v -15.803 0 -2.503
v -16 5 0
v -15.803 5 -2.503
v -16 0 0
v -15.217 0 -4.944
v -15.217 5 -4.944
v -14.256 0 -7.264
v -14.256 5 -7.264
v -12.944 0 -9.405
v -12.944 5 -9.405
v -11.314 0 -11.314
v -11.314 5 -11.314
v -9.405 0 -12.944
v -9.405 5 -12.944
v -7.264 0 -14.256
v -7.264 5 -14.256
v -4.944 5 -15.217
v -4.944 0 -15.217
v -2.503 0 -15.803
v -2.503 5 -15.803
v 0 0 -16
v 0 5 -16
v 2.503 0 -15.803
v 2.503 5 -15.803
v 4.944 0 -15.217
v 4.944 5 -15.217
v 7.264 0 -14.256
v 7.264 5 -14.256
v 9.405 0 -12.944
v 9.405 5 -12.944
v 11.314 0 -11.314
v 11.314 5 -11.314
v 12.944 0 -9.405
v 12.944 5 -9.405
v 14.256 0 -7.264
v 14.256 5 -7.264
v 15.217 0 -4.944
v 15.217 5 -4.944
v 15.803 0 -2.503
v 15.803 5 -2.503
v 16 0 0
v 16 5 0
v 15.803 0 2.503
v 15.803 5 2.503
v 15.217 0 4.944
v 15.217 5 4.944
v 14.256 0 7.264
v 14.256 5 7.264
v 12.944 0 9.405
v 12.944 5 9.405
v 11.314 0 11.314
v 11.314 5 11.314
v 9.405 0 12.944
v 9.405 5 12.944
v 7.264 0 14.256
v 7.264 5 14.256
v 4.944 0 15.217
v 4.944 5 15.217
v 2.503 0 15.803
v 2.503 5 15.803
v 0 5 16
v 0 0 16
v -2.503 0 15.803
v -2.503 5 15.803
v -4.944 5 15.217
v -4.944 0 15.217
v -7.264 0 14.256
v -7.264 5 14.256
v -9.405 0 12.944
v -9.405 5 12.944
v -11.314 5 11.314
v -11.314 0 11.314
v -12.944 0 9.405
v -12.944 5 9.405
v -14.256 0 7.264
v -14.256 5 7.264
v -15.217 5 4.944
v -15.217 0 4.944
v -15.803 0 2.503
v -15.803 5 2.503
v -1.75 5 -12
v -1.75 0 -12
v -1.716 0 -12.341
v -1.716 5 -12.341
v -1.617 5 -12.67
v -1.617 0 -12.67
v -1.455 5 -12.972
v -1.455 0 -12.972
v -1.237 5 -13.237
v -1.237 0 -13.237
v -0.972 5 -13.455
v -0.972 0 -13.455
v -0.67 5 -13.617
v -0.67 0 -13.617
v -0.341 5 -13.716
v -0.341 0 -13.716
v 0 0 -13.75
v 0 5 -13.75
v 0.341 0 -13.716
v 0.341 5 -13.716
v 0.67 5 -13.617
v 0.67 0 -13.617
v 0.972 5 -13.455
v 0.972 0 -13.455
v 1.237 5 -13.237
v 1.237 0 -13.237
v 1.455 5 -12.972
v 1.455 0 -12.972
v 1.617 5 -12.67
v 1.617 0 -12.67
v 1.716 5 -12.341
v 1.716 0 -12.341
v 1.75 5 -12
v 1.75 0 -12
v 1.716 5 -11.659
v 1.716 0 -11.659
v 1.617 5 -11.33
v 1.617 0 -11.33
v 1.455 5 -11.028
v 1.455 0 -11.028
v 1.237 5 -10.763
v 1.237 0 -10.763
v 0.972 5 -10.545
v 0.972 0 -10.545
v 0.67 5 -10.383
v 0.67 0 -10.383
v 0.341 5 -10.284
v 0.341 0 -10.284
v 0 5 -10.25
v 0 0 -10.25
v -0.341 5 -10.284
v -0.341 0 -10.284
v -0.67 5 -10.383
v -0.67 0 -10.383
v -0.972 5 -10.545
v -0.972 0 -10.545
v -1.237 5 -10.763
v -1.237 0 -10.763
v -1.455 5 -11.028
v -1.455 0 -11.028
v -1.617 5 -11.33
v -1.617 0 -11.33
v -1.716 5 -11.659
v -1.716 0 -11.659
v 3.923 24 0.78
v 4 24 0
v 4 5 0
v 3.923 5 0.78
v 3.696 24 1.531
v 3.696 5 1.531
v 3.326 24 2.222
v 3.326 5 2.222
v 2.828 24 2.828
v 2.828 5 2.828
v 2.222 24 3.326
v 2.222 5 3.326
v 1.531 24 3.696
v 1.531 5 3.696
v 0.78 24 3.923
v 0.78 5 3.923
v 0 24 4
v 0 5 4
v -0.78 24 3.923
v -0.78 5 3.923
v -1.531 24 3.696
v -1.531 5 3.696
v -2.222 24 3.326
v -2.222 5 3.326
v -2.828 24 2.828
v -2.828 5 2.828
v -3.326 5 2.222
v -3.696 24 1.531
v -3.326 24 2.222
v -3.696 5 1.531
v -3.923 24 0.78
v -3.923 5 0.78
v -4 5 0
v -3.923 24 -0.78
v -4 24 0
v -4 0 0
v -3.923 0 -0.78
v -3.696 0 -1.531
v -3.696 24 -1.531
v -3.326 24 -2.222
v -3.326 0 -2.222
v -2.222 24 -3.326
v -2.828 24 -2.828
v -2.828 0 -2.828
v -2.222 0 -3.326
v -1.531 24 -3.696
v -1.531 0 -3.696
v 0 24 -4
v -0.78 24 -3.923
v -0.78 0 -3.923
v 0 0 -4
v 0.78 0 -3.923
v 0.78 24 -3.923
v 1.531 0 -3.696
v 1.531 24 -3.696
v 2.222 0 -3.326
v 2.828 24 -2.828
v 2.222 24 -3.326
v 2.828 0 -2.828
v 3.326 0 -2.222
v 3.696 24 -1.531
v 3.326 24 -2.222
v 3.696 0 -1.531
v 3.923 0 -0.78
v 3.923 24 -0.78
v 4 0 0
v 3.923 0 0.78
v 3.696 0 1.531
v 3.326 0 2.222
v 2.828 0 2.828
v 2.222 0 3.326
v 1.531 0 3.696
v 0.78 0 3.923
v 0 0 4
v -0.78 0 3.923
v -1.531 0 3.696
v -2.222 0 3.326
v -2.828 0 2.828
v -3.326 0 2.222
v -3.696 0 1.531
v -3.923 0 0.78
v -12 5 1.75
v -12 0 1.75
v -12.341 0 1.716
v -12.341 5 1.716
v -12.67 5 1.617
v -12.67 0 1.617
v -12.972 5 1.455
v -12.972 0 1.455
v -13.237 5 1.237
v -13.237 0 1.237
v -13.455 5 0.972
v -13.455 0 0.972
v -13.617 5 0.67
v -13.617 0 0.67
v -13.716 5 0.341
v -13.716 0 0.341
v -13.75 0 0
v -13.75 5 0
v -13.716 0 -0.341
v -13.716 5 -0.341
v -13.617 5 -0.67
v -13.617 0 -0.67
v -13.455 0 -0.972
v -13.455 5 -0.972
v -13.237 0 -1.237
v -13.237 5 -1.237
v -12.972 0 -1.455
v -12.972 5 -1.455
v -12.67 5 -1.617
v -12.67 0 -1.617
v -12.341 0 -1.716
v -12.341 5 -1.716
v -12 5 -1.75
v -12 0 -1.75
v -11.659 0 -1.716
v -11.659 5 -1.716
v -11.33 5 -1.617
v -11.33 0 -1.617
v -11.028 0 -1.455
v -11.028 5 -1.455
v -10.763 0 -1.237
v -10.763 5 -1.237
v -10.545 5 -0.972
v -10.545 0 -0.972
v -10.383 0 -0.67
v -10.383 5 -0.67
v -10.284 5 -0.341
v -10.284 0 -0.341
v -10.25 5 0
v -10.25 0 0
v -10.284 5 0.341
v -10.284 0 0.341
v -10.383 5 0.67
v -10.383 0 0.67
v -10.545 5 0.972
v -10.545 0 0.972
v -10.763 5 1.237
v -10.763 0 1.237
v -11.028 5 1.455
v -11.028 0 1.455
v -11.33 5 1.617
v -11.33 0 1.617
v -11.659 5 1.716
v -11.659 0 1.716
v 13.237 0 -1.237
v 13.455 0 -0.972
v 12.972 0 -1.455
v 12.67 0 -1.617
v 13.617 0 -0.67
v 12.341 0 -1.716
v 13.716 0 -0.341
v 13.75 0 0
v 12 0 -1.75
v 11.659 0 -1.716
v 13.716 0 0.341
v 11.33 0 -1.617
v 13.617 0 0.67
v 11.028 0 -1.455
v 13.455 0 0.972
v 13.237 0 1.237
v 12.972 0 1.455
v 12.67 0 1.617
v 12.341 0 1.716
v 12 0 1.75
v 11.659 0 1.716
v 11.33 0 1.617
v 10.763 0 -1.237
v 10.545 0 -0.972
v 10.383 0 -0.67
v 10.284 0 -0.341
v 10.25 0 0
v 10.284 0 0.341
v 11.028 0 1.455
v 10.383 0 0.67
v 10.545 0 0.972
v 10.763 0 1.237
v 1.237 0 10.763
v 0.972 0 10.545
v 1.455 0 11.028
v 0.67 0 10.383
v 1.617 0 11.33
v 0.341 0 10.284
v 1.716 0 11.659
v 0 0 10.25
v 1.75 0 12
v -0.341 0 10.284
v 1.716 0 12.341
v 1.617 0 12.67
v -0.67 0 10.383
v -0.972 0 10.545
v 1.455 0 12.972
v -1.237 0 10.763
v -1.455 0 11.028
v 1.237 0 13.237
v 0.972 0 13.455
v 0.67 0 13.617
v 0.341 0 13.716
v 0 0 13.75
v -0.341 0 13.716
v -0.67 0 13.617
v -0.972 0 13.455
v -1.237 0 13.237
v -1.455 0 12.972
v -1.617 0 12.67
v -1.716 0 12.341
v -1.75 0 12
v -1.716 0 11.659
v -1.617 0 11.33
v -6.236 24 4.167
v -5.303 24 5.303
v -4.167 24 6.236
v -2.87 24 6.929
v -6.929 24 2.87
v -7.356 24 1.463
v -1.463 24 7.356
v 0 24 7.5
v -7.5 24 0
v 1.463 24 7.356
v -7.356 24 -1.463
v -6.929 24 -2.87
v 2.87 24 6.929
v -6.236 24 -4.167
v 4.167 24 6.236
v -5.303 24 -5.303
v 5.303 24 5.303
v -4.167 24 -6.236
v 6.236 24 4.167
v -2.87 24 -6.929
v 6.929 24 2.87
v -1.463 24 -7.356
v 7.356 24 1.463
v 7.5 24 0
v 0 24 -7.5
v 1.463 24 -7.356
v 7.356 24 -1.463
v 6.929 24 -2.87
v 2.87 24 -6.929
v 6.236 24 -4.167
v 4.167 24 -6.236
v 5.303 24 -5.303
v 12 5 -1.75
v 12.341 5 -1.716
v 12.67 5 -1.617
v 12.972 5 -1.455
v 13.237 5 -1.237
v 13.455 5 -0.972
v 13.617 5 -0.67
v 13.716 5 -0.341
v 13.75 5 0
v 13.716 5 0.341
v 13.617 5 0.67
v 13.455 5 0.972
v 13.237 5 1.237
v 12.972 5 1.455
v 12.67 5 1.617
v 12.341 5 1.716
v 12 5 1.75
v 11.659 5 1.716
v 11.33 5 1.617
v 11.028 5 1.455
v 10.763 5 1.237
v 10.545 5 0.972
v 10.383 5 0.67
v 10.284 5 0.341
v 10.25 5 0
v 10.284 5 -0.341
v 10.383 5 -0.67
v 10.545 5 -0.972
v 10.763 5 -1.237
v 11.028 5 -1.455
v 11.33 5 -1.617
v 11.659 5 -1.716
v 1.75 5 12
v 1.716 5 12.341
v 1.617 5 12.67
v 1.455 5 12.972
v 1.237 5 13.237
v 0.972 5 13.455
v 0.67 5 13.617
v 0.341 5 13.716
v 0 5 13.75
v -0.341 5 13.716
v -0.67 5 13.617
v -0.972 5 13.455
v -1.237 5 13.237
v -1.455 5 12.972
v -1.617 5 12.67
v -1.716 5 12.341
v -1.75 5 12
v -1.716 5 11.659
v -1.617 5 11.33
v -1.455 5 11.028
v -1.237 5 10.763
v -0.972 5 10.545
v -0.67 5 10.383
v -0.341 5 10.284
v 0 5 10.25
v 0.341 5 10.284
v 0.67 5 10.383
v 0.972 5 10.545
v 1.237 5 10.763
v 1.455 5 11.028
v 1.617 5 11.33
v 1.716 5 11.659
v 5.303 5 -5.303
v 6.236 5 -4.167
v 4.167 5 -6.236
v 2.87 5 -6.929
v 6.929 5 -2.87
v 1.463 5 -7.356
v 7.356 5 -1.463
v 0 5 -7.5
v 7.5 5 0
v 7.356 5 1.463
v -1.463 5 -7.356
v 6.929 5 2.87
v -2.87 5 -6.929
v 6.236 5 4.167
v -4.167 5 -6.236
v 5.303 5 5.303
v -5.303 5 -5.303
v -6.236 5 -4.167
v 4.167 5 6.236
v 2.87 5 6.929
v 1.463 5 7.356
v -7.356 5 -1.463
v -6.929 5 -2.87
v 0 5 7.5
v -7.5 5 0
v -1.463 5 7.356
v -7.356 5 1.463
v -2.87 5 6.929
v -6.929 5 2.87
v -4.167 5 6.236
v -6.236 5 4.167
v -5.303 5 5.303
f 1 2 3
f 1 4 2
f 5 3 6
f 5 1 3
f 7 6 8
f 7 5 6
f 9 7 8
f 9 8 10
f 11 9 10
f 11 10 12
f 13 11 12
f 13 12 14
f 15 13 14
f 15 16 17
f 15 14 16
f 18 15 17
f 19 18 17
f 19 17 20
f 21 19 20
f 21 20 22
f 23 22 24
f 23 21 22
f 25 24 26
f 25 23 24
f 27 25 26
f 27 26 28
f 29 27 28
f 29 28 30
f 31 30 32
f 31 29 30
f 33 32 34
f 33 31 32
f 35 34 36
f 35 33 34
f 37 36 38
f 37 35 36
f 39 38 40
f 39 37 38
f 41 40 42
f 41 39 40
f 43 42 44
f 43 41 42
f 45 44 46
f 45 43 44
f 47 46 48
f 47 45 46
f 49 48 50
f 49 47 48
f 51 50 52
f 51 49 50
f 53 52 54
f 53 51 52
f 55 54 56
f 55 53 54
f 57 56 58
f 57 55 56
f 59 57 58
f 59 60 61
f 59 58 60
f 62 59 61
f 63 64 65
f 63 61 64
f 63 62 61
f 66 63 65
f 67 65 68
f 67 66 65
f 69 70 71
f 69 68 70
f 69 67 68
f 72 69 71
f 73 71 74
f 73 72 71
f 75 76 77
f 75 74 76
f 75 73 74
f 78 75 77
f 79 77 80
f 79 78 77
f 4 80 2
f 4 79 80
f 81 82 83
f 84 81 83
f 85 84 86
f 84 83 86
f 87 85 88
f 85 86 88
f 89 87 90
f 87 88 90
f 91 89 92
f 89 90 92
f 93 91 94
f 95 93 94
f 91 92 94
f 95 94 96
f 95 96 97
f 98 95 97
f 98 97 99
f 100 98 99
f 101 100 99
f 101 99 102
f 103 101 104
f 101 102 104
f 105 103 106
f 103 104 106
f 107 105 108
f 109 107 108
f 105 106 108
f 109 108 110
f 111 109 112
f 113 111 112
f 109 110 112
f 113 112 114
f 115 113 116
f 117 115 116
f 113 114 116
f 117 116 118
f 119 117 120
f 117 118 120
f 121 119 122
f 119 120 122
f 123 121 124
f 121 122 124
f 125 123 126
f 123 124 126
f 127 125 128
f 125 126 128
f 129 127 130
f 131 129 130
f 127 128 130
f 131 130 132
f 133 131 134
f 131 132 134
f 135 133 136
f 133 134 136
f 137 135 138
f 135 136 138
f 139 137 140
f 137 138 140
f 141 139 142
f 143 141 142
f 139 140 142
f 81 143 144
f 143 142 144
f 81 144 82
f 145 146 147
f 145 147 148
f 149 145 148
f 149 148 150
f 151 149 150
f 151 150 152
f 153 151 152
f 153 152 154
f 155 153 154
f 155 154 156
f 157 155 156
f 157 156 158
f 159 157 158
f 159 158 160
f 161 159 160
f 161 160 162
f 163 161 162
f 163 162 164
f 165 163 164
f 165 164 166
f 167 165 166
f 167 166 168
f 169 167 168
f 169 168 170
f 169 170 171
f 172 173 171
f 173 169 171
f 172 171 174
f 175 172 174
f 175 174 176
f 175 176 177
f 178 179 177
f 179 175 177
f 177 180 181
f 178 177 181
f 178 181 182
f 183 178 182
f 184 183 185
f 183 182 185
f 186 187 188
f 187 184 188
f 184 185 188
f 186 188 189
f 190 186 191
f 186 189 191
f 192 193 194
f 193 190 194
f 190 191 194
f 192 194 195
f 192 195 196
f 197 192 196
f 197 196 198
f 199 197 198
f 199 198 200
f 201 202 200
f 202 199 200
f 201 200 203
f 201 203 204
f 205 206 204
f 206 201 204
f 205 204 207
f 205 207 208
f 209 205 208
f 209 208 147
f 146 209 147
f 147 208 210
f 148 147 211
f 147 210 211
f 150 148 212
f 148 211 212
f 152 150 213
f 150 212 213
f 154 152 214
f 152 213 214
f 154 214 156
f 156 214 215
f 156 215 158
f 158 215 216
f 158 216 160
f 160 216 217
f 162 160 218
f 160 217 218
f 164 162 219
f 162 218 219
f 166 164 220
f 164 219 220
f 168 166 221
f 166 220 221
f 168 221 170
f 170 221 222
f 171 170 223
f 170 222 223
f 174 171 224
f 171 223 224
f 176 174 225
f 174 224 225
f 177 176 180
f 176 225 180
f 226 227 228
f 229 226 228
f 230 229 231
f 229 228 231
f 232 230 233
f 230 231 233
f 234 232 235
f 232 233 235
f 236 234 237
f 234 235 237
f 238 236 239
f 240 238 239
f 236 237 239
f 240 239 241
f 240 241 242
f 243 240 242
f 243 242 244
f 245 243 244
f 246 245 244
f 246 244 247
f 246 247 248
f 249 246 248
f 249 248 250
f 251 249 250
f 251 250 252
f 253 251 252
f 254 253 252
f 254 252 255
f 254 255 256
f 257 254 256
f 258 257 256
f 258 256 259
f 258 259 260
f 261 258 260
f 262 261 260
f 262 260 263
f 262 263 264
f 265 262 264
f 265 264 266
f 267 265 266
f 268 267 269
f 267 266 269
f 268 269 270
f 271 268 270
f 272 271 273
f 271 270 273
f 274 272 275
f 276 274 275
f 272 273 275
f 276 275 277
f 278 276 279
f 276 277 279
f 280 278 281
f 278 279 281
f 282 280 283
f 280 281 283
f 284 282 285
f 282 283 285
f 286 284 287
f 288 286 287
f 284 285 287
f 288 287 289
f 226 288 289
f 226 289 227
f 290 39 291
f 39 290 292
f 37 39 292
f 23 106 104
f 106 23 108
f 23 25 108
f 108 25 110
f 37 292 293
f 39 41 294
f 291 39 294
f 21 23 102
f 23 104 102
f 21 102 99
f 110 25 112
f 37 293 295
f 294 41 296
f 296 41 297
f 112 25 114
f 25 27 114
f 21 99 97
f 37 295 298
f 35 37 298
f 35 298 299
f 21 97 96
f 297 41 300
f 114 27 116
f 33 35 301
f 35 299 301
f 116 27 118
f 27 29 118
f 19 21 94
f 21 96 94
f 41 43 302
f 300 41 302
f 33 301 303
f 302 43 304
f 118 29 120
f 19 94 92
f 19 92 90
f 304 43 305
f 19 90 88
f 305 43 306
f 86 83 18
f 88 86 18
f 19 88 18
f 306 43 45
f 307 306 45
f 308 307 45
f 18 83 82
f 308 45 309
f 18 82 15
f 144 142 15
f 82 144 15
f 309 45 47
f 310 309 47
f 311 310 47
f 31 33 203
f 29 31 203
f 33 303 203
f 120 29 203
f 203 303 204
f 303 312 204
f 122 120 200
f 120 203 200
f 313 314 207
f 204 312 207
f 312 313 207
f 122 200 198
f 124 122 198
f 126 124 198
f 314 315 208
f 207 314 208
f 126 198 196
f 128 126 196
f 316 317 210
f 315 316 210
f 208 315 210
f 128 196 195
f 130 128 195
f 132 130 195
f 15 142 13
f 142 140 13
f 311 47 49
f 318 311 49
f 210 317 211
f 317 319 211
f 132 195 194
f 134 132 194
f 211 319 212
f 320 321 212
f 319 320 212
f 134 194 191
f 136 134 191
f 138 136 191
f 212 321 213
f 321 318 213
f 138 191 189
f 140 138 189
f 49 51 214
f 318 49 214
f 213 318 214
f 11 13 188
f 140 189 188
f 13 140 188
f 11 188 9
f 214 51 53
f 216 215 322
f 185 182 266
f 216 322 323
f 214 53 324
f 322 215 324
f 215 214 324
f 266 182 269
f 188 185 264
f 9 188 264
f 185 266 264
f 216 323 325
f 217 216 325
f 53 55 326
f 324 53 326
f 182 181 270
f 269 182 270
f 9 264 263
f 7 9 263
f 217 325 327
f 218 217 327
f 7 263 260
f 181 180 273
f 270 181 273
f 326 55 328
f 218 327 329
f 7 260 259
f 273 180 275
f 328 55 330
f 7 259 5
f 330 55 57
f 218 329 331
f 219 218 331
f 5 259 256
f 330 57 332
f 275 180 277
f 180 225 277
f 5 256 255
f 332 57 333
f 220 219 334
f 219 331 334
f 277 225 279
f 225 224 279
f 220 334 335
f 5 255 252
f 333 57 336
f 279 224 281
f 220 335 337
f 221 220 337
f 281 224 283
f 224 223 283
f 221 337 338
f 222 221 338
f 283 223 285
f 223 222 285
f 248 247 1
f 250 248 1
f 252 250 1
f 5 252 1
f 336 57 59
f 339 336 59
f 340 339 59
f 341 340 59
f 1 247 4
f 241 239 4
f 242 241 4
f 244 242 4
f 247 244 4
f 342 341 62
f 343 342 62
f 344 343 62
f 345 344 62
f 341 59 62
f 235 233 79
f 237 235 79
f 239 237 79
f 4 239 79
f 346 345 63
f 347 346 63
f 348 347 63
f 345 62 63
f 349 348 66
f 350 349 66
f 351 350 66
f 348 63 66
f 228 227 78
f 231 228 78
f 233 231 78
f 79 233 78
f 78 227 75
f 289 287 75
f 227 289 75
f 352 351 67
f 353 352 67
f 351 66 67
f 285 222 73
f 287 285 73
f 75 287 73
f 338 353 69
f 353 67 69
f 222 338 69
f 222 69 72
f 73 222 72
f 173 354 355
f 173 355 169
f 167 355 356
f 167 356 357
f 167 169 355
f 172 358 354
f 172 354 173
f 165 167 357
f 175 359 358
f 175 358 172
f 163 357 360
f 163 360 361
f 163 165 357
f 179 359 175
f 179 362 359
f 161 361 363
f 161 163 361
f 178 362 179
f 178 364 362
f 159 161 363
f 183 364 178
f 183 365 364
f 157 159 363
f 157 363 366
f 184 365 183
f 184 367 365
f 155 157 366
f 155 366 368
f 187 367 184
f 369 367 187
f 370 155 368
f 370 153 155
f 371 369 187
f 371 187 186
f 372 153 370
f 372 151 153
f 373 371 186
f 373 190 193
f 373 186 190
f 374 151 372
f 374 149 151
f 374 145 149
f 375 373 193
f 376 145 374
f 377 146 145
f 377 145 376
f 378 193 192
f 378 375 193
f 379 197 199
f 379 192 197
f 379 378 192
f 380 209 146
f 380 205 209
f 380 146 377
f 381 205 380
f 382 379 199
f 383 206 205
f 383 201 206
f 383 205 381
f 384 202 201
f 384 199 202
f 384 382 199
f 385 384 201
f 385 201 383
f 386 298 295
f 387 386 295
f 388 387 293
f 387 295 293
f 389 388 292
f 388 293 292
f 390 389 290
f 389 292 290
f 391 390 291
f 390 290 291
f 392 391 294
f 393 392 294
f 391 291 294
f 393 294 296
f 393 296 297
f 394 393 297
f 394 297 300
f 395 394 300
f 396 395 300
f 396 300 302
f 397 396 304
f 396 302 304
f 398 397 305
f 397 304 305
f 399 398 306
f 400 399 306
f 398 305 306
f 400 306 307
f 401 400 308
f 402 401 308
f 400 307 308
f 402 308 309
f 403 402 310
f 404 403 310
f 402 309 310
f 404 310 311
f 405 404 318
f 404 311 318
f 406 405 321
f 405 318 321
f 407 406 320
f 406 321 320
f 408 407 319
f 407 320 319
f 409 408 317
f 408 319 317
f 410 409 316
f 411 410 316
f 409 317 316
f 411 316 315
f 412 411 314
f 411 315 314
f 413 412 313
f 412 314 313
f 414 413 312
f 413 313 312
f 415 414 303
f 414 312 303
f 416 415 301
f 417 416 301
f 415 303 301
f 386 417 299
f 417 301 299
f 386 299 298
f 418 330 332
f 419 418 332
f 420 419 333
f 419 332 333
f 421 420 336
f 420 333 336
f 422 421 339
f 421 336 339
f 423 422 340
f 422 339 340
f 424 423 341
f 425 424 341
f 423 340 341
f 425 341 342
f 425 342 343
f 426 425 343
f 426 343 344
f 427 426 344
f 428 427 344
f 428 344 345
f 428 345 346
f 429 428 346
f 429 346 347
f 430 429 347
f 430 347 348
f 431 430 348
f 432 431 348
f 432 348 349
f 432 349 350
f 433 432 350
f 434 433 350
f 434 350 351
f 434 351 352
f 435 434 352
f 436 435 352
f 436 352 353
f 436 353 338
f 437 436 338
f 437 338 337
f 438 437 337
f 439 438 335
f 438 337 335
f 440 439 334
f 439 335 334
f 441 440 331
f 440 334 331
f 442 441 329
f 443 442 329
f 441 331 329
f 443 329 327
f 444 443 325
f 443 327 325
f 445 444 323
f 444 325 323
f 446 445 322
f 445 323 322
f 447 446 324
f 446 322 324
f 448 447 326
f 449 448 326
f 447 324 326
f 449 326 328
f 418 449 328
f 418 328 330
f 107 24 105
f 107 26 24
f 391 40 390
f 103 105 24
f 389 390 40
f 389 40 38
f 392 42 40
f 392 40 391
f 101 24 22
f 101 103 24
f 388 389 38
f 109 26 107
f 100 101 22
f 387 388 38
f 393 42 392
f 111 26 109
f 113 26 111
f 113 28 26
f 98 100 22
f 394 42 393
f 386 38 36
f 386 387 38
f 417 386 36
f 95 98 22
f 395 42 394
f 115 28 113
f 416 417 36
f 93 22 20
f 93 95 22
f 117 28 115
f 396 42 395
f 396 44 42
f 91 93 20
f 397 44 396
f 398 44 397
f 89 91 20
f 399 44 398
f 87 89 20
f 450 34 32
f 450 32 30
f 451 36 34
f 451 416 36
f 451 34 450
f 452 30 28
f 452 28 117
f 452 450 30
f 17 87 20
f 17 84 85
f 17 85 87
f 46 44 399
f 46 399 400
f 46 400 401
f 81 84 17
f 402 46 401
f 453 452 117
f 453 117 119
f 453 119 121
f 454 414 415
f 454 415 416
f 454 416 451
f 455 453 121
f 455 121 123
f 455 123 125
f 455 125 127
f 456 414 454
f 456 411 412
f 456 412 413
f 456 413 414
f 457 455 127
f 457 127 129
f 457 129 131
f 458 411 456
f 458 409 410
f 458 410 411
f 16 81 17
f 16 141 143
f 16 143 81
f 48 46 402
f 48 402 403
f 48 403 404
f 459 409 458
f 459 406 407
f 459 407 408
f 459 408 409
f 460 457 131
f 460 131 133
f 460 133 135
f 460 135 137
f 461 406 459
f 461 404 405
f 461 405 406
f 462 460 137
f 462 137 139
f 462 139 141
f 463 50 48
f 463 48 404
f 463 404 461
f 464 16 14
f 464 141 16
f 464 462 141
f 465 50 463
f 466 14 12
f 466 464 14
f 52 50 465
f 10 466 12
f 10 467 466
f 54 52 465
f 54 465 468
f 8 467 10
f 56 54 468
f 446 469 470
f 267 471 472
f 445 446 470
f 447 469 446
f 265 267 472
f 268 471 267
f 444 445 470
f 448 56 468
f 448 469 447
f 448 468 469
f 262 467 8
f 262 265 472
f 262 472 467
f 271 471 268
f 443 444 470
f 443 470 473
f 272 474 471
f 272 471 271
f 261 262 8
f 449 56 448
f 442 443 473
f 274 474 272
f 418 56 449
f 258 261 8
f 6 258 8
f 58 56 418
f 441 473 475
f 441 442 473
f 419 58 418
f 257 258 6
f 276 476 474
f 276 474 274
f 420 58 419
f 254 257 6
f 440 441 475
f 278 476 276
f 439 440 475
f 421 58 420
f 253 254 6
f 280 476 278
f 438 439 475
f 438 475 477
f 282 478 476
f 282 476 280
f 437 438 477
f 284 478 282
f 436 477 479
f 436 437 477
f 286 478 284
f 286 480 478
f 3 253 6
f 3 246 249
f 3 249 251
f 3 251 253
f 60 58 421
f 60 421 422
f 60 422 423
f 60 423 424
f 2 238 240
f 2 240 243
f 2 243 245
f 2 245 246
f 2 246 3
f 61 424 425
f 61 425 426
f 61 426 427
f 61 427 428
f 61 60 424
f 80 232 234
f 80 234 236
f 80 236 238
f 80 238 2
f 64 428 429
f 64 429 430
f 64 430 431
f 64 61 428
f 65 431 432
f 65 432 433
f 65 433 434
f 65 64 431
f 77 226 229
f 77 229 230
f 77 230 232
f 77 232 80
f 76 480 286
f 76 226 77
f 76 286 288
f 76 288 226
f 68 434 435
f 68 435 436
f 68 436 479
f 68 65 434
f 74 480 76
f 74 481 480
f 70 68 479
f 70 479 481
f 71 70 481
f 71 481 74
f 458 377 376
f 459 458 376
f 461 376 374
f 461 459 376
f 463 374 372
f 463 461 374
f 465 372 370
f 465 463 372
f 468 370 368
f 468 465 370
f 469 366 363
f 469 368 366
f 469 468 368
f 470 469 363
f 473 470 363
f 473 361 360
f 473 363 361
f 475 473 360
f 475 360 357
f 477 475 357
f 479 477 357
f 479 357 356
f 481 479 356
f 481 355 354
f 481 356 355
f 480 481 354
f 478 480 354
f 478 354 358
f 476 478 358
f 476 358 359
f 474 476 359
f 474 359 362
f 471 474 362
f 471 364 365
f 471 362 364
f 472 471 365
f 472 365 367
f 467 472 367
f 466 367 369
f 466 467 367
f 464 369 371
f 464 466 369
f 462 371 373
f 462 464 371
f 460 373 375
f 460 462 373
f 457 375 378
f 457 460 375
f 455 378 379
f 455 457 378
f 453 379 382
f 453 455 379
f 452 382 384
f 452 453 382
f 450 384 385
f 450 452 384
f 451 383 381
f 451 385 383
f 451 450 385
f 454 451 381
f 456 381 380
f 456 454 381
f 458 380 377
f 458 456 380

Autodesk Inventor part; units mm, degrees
ref_plane "YZ Plane" through (0, 0, 0) normal (1, 0, 0) x (0, 1, 0)
ref_plane "XZ Plane" through (0, 0, 0) normal (0, 1, 0) x (-1, 0, 0)
ref_plane "XY Plane" through (0, 0, 0) normal (0, 0, 1) x (1, 0, 0)
sketch "Sketch1" plane through (0, 0, 0) normal (0, 1, 0) x (-1, 0, 0)
  circle A0 centre (0, 0) radius 4
  circle A1 centre (0, 0) radius 16
  dimension "d0" = 8
  dimension "d1" = 32
extrude "Extrusion1" add sketch "Sketch1" along normal blind 5
sketch "Sketch2" plane through (0, 5, 0) normal (0, 1, 0) x (1, 0, 0)
  circle A0 centre (0, 0) radius 4
  circle A1 centre (0, 0) radius 7.5
  dimension "d4" = 15
extrude "Extrusion2" add sketch "Sketch2" along normal blind 19
sketch "Sketch3" plane through (0, 0, 0) normal (0, -1, 0) x (1, 0, 0)
  point P0 (0, 0)
sketch "Sketch4" plane through (0, 0, 0) normal (0, -1, 0) x (1, 0, 0)
  circle A0 centre (0, 12) radius 1.75
  point P0 (0, 0)
  dimension "d8" = 3.5
extrude "Extrusion3" cut sketch "Sketch4" against normal blind 19
pattern_circular "Circular Pattern1" count 4 over 360 about axis through (0, -10, 0) along (0, 1, 0) of "Extrusion3"
properties part number "Soporte Eje"
